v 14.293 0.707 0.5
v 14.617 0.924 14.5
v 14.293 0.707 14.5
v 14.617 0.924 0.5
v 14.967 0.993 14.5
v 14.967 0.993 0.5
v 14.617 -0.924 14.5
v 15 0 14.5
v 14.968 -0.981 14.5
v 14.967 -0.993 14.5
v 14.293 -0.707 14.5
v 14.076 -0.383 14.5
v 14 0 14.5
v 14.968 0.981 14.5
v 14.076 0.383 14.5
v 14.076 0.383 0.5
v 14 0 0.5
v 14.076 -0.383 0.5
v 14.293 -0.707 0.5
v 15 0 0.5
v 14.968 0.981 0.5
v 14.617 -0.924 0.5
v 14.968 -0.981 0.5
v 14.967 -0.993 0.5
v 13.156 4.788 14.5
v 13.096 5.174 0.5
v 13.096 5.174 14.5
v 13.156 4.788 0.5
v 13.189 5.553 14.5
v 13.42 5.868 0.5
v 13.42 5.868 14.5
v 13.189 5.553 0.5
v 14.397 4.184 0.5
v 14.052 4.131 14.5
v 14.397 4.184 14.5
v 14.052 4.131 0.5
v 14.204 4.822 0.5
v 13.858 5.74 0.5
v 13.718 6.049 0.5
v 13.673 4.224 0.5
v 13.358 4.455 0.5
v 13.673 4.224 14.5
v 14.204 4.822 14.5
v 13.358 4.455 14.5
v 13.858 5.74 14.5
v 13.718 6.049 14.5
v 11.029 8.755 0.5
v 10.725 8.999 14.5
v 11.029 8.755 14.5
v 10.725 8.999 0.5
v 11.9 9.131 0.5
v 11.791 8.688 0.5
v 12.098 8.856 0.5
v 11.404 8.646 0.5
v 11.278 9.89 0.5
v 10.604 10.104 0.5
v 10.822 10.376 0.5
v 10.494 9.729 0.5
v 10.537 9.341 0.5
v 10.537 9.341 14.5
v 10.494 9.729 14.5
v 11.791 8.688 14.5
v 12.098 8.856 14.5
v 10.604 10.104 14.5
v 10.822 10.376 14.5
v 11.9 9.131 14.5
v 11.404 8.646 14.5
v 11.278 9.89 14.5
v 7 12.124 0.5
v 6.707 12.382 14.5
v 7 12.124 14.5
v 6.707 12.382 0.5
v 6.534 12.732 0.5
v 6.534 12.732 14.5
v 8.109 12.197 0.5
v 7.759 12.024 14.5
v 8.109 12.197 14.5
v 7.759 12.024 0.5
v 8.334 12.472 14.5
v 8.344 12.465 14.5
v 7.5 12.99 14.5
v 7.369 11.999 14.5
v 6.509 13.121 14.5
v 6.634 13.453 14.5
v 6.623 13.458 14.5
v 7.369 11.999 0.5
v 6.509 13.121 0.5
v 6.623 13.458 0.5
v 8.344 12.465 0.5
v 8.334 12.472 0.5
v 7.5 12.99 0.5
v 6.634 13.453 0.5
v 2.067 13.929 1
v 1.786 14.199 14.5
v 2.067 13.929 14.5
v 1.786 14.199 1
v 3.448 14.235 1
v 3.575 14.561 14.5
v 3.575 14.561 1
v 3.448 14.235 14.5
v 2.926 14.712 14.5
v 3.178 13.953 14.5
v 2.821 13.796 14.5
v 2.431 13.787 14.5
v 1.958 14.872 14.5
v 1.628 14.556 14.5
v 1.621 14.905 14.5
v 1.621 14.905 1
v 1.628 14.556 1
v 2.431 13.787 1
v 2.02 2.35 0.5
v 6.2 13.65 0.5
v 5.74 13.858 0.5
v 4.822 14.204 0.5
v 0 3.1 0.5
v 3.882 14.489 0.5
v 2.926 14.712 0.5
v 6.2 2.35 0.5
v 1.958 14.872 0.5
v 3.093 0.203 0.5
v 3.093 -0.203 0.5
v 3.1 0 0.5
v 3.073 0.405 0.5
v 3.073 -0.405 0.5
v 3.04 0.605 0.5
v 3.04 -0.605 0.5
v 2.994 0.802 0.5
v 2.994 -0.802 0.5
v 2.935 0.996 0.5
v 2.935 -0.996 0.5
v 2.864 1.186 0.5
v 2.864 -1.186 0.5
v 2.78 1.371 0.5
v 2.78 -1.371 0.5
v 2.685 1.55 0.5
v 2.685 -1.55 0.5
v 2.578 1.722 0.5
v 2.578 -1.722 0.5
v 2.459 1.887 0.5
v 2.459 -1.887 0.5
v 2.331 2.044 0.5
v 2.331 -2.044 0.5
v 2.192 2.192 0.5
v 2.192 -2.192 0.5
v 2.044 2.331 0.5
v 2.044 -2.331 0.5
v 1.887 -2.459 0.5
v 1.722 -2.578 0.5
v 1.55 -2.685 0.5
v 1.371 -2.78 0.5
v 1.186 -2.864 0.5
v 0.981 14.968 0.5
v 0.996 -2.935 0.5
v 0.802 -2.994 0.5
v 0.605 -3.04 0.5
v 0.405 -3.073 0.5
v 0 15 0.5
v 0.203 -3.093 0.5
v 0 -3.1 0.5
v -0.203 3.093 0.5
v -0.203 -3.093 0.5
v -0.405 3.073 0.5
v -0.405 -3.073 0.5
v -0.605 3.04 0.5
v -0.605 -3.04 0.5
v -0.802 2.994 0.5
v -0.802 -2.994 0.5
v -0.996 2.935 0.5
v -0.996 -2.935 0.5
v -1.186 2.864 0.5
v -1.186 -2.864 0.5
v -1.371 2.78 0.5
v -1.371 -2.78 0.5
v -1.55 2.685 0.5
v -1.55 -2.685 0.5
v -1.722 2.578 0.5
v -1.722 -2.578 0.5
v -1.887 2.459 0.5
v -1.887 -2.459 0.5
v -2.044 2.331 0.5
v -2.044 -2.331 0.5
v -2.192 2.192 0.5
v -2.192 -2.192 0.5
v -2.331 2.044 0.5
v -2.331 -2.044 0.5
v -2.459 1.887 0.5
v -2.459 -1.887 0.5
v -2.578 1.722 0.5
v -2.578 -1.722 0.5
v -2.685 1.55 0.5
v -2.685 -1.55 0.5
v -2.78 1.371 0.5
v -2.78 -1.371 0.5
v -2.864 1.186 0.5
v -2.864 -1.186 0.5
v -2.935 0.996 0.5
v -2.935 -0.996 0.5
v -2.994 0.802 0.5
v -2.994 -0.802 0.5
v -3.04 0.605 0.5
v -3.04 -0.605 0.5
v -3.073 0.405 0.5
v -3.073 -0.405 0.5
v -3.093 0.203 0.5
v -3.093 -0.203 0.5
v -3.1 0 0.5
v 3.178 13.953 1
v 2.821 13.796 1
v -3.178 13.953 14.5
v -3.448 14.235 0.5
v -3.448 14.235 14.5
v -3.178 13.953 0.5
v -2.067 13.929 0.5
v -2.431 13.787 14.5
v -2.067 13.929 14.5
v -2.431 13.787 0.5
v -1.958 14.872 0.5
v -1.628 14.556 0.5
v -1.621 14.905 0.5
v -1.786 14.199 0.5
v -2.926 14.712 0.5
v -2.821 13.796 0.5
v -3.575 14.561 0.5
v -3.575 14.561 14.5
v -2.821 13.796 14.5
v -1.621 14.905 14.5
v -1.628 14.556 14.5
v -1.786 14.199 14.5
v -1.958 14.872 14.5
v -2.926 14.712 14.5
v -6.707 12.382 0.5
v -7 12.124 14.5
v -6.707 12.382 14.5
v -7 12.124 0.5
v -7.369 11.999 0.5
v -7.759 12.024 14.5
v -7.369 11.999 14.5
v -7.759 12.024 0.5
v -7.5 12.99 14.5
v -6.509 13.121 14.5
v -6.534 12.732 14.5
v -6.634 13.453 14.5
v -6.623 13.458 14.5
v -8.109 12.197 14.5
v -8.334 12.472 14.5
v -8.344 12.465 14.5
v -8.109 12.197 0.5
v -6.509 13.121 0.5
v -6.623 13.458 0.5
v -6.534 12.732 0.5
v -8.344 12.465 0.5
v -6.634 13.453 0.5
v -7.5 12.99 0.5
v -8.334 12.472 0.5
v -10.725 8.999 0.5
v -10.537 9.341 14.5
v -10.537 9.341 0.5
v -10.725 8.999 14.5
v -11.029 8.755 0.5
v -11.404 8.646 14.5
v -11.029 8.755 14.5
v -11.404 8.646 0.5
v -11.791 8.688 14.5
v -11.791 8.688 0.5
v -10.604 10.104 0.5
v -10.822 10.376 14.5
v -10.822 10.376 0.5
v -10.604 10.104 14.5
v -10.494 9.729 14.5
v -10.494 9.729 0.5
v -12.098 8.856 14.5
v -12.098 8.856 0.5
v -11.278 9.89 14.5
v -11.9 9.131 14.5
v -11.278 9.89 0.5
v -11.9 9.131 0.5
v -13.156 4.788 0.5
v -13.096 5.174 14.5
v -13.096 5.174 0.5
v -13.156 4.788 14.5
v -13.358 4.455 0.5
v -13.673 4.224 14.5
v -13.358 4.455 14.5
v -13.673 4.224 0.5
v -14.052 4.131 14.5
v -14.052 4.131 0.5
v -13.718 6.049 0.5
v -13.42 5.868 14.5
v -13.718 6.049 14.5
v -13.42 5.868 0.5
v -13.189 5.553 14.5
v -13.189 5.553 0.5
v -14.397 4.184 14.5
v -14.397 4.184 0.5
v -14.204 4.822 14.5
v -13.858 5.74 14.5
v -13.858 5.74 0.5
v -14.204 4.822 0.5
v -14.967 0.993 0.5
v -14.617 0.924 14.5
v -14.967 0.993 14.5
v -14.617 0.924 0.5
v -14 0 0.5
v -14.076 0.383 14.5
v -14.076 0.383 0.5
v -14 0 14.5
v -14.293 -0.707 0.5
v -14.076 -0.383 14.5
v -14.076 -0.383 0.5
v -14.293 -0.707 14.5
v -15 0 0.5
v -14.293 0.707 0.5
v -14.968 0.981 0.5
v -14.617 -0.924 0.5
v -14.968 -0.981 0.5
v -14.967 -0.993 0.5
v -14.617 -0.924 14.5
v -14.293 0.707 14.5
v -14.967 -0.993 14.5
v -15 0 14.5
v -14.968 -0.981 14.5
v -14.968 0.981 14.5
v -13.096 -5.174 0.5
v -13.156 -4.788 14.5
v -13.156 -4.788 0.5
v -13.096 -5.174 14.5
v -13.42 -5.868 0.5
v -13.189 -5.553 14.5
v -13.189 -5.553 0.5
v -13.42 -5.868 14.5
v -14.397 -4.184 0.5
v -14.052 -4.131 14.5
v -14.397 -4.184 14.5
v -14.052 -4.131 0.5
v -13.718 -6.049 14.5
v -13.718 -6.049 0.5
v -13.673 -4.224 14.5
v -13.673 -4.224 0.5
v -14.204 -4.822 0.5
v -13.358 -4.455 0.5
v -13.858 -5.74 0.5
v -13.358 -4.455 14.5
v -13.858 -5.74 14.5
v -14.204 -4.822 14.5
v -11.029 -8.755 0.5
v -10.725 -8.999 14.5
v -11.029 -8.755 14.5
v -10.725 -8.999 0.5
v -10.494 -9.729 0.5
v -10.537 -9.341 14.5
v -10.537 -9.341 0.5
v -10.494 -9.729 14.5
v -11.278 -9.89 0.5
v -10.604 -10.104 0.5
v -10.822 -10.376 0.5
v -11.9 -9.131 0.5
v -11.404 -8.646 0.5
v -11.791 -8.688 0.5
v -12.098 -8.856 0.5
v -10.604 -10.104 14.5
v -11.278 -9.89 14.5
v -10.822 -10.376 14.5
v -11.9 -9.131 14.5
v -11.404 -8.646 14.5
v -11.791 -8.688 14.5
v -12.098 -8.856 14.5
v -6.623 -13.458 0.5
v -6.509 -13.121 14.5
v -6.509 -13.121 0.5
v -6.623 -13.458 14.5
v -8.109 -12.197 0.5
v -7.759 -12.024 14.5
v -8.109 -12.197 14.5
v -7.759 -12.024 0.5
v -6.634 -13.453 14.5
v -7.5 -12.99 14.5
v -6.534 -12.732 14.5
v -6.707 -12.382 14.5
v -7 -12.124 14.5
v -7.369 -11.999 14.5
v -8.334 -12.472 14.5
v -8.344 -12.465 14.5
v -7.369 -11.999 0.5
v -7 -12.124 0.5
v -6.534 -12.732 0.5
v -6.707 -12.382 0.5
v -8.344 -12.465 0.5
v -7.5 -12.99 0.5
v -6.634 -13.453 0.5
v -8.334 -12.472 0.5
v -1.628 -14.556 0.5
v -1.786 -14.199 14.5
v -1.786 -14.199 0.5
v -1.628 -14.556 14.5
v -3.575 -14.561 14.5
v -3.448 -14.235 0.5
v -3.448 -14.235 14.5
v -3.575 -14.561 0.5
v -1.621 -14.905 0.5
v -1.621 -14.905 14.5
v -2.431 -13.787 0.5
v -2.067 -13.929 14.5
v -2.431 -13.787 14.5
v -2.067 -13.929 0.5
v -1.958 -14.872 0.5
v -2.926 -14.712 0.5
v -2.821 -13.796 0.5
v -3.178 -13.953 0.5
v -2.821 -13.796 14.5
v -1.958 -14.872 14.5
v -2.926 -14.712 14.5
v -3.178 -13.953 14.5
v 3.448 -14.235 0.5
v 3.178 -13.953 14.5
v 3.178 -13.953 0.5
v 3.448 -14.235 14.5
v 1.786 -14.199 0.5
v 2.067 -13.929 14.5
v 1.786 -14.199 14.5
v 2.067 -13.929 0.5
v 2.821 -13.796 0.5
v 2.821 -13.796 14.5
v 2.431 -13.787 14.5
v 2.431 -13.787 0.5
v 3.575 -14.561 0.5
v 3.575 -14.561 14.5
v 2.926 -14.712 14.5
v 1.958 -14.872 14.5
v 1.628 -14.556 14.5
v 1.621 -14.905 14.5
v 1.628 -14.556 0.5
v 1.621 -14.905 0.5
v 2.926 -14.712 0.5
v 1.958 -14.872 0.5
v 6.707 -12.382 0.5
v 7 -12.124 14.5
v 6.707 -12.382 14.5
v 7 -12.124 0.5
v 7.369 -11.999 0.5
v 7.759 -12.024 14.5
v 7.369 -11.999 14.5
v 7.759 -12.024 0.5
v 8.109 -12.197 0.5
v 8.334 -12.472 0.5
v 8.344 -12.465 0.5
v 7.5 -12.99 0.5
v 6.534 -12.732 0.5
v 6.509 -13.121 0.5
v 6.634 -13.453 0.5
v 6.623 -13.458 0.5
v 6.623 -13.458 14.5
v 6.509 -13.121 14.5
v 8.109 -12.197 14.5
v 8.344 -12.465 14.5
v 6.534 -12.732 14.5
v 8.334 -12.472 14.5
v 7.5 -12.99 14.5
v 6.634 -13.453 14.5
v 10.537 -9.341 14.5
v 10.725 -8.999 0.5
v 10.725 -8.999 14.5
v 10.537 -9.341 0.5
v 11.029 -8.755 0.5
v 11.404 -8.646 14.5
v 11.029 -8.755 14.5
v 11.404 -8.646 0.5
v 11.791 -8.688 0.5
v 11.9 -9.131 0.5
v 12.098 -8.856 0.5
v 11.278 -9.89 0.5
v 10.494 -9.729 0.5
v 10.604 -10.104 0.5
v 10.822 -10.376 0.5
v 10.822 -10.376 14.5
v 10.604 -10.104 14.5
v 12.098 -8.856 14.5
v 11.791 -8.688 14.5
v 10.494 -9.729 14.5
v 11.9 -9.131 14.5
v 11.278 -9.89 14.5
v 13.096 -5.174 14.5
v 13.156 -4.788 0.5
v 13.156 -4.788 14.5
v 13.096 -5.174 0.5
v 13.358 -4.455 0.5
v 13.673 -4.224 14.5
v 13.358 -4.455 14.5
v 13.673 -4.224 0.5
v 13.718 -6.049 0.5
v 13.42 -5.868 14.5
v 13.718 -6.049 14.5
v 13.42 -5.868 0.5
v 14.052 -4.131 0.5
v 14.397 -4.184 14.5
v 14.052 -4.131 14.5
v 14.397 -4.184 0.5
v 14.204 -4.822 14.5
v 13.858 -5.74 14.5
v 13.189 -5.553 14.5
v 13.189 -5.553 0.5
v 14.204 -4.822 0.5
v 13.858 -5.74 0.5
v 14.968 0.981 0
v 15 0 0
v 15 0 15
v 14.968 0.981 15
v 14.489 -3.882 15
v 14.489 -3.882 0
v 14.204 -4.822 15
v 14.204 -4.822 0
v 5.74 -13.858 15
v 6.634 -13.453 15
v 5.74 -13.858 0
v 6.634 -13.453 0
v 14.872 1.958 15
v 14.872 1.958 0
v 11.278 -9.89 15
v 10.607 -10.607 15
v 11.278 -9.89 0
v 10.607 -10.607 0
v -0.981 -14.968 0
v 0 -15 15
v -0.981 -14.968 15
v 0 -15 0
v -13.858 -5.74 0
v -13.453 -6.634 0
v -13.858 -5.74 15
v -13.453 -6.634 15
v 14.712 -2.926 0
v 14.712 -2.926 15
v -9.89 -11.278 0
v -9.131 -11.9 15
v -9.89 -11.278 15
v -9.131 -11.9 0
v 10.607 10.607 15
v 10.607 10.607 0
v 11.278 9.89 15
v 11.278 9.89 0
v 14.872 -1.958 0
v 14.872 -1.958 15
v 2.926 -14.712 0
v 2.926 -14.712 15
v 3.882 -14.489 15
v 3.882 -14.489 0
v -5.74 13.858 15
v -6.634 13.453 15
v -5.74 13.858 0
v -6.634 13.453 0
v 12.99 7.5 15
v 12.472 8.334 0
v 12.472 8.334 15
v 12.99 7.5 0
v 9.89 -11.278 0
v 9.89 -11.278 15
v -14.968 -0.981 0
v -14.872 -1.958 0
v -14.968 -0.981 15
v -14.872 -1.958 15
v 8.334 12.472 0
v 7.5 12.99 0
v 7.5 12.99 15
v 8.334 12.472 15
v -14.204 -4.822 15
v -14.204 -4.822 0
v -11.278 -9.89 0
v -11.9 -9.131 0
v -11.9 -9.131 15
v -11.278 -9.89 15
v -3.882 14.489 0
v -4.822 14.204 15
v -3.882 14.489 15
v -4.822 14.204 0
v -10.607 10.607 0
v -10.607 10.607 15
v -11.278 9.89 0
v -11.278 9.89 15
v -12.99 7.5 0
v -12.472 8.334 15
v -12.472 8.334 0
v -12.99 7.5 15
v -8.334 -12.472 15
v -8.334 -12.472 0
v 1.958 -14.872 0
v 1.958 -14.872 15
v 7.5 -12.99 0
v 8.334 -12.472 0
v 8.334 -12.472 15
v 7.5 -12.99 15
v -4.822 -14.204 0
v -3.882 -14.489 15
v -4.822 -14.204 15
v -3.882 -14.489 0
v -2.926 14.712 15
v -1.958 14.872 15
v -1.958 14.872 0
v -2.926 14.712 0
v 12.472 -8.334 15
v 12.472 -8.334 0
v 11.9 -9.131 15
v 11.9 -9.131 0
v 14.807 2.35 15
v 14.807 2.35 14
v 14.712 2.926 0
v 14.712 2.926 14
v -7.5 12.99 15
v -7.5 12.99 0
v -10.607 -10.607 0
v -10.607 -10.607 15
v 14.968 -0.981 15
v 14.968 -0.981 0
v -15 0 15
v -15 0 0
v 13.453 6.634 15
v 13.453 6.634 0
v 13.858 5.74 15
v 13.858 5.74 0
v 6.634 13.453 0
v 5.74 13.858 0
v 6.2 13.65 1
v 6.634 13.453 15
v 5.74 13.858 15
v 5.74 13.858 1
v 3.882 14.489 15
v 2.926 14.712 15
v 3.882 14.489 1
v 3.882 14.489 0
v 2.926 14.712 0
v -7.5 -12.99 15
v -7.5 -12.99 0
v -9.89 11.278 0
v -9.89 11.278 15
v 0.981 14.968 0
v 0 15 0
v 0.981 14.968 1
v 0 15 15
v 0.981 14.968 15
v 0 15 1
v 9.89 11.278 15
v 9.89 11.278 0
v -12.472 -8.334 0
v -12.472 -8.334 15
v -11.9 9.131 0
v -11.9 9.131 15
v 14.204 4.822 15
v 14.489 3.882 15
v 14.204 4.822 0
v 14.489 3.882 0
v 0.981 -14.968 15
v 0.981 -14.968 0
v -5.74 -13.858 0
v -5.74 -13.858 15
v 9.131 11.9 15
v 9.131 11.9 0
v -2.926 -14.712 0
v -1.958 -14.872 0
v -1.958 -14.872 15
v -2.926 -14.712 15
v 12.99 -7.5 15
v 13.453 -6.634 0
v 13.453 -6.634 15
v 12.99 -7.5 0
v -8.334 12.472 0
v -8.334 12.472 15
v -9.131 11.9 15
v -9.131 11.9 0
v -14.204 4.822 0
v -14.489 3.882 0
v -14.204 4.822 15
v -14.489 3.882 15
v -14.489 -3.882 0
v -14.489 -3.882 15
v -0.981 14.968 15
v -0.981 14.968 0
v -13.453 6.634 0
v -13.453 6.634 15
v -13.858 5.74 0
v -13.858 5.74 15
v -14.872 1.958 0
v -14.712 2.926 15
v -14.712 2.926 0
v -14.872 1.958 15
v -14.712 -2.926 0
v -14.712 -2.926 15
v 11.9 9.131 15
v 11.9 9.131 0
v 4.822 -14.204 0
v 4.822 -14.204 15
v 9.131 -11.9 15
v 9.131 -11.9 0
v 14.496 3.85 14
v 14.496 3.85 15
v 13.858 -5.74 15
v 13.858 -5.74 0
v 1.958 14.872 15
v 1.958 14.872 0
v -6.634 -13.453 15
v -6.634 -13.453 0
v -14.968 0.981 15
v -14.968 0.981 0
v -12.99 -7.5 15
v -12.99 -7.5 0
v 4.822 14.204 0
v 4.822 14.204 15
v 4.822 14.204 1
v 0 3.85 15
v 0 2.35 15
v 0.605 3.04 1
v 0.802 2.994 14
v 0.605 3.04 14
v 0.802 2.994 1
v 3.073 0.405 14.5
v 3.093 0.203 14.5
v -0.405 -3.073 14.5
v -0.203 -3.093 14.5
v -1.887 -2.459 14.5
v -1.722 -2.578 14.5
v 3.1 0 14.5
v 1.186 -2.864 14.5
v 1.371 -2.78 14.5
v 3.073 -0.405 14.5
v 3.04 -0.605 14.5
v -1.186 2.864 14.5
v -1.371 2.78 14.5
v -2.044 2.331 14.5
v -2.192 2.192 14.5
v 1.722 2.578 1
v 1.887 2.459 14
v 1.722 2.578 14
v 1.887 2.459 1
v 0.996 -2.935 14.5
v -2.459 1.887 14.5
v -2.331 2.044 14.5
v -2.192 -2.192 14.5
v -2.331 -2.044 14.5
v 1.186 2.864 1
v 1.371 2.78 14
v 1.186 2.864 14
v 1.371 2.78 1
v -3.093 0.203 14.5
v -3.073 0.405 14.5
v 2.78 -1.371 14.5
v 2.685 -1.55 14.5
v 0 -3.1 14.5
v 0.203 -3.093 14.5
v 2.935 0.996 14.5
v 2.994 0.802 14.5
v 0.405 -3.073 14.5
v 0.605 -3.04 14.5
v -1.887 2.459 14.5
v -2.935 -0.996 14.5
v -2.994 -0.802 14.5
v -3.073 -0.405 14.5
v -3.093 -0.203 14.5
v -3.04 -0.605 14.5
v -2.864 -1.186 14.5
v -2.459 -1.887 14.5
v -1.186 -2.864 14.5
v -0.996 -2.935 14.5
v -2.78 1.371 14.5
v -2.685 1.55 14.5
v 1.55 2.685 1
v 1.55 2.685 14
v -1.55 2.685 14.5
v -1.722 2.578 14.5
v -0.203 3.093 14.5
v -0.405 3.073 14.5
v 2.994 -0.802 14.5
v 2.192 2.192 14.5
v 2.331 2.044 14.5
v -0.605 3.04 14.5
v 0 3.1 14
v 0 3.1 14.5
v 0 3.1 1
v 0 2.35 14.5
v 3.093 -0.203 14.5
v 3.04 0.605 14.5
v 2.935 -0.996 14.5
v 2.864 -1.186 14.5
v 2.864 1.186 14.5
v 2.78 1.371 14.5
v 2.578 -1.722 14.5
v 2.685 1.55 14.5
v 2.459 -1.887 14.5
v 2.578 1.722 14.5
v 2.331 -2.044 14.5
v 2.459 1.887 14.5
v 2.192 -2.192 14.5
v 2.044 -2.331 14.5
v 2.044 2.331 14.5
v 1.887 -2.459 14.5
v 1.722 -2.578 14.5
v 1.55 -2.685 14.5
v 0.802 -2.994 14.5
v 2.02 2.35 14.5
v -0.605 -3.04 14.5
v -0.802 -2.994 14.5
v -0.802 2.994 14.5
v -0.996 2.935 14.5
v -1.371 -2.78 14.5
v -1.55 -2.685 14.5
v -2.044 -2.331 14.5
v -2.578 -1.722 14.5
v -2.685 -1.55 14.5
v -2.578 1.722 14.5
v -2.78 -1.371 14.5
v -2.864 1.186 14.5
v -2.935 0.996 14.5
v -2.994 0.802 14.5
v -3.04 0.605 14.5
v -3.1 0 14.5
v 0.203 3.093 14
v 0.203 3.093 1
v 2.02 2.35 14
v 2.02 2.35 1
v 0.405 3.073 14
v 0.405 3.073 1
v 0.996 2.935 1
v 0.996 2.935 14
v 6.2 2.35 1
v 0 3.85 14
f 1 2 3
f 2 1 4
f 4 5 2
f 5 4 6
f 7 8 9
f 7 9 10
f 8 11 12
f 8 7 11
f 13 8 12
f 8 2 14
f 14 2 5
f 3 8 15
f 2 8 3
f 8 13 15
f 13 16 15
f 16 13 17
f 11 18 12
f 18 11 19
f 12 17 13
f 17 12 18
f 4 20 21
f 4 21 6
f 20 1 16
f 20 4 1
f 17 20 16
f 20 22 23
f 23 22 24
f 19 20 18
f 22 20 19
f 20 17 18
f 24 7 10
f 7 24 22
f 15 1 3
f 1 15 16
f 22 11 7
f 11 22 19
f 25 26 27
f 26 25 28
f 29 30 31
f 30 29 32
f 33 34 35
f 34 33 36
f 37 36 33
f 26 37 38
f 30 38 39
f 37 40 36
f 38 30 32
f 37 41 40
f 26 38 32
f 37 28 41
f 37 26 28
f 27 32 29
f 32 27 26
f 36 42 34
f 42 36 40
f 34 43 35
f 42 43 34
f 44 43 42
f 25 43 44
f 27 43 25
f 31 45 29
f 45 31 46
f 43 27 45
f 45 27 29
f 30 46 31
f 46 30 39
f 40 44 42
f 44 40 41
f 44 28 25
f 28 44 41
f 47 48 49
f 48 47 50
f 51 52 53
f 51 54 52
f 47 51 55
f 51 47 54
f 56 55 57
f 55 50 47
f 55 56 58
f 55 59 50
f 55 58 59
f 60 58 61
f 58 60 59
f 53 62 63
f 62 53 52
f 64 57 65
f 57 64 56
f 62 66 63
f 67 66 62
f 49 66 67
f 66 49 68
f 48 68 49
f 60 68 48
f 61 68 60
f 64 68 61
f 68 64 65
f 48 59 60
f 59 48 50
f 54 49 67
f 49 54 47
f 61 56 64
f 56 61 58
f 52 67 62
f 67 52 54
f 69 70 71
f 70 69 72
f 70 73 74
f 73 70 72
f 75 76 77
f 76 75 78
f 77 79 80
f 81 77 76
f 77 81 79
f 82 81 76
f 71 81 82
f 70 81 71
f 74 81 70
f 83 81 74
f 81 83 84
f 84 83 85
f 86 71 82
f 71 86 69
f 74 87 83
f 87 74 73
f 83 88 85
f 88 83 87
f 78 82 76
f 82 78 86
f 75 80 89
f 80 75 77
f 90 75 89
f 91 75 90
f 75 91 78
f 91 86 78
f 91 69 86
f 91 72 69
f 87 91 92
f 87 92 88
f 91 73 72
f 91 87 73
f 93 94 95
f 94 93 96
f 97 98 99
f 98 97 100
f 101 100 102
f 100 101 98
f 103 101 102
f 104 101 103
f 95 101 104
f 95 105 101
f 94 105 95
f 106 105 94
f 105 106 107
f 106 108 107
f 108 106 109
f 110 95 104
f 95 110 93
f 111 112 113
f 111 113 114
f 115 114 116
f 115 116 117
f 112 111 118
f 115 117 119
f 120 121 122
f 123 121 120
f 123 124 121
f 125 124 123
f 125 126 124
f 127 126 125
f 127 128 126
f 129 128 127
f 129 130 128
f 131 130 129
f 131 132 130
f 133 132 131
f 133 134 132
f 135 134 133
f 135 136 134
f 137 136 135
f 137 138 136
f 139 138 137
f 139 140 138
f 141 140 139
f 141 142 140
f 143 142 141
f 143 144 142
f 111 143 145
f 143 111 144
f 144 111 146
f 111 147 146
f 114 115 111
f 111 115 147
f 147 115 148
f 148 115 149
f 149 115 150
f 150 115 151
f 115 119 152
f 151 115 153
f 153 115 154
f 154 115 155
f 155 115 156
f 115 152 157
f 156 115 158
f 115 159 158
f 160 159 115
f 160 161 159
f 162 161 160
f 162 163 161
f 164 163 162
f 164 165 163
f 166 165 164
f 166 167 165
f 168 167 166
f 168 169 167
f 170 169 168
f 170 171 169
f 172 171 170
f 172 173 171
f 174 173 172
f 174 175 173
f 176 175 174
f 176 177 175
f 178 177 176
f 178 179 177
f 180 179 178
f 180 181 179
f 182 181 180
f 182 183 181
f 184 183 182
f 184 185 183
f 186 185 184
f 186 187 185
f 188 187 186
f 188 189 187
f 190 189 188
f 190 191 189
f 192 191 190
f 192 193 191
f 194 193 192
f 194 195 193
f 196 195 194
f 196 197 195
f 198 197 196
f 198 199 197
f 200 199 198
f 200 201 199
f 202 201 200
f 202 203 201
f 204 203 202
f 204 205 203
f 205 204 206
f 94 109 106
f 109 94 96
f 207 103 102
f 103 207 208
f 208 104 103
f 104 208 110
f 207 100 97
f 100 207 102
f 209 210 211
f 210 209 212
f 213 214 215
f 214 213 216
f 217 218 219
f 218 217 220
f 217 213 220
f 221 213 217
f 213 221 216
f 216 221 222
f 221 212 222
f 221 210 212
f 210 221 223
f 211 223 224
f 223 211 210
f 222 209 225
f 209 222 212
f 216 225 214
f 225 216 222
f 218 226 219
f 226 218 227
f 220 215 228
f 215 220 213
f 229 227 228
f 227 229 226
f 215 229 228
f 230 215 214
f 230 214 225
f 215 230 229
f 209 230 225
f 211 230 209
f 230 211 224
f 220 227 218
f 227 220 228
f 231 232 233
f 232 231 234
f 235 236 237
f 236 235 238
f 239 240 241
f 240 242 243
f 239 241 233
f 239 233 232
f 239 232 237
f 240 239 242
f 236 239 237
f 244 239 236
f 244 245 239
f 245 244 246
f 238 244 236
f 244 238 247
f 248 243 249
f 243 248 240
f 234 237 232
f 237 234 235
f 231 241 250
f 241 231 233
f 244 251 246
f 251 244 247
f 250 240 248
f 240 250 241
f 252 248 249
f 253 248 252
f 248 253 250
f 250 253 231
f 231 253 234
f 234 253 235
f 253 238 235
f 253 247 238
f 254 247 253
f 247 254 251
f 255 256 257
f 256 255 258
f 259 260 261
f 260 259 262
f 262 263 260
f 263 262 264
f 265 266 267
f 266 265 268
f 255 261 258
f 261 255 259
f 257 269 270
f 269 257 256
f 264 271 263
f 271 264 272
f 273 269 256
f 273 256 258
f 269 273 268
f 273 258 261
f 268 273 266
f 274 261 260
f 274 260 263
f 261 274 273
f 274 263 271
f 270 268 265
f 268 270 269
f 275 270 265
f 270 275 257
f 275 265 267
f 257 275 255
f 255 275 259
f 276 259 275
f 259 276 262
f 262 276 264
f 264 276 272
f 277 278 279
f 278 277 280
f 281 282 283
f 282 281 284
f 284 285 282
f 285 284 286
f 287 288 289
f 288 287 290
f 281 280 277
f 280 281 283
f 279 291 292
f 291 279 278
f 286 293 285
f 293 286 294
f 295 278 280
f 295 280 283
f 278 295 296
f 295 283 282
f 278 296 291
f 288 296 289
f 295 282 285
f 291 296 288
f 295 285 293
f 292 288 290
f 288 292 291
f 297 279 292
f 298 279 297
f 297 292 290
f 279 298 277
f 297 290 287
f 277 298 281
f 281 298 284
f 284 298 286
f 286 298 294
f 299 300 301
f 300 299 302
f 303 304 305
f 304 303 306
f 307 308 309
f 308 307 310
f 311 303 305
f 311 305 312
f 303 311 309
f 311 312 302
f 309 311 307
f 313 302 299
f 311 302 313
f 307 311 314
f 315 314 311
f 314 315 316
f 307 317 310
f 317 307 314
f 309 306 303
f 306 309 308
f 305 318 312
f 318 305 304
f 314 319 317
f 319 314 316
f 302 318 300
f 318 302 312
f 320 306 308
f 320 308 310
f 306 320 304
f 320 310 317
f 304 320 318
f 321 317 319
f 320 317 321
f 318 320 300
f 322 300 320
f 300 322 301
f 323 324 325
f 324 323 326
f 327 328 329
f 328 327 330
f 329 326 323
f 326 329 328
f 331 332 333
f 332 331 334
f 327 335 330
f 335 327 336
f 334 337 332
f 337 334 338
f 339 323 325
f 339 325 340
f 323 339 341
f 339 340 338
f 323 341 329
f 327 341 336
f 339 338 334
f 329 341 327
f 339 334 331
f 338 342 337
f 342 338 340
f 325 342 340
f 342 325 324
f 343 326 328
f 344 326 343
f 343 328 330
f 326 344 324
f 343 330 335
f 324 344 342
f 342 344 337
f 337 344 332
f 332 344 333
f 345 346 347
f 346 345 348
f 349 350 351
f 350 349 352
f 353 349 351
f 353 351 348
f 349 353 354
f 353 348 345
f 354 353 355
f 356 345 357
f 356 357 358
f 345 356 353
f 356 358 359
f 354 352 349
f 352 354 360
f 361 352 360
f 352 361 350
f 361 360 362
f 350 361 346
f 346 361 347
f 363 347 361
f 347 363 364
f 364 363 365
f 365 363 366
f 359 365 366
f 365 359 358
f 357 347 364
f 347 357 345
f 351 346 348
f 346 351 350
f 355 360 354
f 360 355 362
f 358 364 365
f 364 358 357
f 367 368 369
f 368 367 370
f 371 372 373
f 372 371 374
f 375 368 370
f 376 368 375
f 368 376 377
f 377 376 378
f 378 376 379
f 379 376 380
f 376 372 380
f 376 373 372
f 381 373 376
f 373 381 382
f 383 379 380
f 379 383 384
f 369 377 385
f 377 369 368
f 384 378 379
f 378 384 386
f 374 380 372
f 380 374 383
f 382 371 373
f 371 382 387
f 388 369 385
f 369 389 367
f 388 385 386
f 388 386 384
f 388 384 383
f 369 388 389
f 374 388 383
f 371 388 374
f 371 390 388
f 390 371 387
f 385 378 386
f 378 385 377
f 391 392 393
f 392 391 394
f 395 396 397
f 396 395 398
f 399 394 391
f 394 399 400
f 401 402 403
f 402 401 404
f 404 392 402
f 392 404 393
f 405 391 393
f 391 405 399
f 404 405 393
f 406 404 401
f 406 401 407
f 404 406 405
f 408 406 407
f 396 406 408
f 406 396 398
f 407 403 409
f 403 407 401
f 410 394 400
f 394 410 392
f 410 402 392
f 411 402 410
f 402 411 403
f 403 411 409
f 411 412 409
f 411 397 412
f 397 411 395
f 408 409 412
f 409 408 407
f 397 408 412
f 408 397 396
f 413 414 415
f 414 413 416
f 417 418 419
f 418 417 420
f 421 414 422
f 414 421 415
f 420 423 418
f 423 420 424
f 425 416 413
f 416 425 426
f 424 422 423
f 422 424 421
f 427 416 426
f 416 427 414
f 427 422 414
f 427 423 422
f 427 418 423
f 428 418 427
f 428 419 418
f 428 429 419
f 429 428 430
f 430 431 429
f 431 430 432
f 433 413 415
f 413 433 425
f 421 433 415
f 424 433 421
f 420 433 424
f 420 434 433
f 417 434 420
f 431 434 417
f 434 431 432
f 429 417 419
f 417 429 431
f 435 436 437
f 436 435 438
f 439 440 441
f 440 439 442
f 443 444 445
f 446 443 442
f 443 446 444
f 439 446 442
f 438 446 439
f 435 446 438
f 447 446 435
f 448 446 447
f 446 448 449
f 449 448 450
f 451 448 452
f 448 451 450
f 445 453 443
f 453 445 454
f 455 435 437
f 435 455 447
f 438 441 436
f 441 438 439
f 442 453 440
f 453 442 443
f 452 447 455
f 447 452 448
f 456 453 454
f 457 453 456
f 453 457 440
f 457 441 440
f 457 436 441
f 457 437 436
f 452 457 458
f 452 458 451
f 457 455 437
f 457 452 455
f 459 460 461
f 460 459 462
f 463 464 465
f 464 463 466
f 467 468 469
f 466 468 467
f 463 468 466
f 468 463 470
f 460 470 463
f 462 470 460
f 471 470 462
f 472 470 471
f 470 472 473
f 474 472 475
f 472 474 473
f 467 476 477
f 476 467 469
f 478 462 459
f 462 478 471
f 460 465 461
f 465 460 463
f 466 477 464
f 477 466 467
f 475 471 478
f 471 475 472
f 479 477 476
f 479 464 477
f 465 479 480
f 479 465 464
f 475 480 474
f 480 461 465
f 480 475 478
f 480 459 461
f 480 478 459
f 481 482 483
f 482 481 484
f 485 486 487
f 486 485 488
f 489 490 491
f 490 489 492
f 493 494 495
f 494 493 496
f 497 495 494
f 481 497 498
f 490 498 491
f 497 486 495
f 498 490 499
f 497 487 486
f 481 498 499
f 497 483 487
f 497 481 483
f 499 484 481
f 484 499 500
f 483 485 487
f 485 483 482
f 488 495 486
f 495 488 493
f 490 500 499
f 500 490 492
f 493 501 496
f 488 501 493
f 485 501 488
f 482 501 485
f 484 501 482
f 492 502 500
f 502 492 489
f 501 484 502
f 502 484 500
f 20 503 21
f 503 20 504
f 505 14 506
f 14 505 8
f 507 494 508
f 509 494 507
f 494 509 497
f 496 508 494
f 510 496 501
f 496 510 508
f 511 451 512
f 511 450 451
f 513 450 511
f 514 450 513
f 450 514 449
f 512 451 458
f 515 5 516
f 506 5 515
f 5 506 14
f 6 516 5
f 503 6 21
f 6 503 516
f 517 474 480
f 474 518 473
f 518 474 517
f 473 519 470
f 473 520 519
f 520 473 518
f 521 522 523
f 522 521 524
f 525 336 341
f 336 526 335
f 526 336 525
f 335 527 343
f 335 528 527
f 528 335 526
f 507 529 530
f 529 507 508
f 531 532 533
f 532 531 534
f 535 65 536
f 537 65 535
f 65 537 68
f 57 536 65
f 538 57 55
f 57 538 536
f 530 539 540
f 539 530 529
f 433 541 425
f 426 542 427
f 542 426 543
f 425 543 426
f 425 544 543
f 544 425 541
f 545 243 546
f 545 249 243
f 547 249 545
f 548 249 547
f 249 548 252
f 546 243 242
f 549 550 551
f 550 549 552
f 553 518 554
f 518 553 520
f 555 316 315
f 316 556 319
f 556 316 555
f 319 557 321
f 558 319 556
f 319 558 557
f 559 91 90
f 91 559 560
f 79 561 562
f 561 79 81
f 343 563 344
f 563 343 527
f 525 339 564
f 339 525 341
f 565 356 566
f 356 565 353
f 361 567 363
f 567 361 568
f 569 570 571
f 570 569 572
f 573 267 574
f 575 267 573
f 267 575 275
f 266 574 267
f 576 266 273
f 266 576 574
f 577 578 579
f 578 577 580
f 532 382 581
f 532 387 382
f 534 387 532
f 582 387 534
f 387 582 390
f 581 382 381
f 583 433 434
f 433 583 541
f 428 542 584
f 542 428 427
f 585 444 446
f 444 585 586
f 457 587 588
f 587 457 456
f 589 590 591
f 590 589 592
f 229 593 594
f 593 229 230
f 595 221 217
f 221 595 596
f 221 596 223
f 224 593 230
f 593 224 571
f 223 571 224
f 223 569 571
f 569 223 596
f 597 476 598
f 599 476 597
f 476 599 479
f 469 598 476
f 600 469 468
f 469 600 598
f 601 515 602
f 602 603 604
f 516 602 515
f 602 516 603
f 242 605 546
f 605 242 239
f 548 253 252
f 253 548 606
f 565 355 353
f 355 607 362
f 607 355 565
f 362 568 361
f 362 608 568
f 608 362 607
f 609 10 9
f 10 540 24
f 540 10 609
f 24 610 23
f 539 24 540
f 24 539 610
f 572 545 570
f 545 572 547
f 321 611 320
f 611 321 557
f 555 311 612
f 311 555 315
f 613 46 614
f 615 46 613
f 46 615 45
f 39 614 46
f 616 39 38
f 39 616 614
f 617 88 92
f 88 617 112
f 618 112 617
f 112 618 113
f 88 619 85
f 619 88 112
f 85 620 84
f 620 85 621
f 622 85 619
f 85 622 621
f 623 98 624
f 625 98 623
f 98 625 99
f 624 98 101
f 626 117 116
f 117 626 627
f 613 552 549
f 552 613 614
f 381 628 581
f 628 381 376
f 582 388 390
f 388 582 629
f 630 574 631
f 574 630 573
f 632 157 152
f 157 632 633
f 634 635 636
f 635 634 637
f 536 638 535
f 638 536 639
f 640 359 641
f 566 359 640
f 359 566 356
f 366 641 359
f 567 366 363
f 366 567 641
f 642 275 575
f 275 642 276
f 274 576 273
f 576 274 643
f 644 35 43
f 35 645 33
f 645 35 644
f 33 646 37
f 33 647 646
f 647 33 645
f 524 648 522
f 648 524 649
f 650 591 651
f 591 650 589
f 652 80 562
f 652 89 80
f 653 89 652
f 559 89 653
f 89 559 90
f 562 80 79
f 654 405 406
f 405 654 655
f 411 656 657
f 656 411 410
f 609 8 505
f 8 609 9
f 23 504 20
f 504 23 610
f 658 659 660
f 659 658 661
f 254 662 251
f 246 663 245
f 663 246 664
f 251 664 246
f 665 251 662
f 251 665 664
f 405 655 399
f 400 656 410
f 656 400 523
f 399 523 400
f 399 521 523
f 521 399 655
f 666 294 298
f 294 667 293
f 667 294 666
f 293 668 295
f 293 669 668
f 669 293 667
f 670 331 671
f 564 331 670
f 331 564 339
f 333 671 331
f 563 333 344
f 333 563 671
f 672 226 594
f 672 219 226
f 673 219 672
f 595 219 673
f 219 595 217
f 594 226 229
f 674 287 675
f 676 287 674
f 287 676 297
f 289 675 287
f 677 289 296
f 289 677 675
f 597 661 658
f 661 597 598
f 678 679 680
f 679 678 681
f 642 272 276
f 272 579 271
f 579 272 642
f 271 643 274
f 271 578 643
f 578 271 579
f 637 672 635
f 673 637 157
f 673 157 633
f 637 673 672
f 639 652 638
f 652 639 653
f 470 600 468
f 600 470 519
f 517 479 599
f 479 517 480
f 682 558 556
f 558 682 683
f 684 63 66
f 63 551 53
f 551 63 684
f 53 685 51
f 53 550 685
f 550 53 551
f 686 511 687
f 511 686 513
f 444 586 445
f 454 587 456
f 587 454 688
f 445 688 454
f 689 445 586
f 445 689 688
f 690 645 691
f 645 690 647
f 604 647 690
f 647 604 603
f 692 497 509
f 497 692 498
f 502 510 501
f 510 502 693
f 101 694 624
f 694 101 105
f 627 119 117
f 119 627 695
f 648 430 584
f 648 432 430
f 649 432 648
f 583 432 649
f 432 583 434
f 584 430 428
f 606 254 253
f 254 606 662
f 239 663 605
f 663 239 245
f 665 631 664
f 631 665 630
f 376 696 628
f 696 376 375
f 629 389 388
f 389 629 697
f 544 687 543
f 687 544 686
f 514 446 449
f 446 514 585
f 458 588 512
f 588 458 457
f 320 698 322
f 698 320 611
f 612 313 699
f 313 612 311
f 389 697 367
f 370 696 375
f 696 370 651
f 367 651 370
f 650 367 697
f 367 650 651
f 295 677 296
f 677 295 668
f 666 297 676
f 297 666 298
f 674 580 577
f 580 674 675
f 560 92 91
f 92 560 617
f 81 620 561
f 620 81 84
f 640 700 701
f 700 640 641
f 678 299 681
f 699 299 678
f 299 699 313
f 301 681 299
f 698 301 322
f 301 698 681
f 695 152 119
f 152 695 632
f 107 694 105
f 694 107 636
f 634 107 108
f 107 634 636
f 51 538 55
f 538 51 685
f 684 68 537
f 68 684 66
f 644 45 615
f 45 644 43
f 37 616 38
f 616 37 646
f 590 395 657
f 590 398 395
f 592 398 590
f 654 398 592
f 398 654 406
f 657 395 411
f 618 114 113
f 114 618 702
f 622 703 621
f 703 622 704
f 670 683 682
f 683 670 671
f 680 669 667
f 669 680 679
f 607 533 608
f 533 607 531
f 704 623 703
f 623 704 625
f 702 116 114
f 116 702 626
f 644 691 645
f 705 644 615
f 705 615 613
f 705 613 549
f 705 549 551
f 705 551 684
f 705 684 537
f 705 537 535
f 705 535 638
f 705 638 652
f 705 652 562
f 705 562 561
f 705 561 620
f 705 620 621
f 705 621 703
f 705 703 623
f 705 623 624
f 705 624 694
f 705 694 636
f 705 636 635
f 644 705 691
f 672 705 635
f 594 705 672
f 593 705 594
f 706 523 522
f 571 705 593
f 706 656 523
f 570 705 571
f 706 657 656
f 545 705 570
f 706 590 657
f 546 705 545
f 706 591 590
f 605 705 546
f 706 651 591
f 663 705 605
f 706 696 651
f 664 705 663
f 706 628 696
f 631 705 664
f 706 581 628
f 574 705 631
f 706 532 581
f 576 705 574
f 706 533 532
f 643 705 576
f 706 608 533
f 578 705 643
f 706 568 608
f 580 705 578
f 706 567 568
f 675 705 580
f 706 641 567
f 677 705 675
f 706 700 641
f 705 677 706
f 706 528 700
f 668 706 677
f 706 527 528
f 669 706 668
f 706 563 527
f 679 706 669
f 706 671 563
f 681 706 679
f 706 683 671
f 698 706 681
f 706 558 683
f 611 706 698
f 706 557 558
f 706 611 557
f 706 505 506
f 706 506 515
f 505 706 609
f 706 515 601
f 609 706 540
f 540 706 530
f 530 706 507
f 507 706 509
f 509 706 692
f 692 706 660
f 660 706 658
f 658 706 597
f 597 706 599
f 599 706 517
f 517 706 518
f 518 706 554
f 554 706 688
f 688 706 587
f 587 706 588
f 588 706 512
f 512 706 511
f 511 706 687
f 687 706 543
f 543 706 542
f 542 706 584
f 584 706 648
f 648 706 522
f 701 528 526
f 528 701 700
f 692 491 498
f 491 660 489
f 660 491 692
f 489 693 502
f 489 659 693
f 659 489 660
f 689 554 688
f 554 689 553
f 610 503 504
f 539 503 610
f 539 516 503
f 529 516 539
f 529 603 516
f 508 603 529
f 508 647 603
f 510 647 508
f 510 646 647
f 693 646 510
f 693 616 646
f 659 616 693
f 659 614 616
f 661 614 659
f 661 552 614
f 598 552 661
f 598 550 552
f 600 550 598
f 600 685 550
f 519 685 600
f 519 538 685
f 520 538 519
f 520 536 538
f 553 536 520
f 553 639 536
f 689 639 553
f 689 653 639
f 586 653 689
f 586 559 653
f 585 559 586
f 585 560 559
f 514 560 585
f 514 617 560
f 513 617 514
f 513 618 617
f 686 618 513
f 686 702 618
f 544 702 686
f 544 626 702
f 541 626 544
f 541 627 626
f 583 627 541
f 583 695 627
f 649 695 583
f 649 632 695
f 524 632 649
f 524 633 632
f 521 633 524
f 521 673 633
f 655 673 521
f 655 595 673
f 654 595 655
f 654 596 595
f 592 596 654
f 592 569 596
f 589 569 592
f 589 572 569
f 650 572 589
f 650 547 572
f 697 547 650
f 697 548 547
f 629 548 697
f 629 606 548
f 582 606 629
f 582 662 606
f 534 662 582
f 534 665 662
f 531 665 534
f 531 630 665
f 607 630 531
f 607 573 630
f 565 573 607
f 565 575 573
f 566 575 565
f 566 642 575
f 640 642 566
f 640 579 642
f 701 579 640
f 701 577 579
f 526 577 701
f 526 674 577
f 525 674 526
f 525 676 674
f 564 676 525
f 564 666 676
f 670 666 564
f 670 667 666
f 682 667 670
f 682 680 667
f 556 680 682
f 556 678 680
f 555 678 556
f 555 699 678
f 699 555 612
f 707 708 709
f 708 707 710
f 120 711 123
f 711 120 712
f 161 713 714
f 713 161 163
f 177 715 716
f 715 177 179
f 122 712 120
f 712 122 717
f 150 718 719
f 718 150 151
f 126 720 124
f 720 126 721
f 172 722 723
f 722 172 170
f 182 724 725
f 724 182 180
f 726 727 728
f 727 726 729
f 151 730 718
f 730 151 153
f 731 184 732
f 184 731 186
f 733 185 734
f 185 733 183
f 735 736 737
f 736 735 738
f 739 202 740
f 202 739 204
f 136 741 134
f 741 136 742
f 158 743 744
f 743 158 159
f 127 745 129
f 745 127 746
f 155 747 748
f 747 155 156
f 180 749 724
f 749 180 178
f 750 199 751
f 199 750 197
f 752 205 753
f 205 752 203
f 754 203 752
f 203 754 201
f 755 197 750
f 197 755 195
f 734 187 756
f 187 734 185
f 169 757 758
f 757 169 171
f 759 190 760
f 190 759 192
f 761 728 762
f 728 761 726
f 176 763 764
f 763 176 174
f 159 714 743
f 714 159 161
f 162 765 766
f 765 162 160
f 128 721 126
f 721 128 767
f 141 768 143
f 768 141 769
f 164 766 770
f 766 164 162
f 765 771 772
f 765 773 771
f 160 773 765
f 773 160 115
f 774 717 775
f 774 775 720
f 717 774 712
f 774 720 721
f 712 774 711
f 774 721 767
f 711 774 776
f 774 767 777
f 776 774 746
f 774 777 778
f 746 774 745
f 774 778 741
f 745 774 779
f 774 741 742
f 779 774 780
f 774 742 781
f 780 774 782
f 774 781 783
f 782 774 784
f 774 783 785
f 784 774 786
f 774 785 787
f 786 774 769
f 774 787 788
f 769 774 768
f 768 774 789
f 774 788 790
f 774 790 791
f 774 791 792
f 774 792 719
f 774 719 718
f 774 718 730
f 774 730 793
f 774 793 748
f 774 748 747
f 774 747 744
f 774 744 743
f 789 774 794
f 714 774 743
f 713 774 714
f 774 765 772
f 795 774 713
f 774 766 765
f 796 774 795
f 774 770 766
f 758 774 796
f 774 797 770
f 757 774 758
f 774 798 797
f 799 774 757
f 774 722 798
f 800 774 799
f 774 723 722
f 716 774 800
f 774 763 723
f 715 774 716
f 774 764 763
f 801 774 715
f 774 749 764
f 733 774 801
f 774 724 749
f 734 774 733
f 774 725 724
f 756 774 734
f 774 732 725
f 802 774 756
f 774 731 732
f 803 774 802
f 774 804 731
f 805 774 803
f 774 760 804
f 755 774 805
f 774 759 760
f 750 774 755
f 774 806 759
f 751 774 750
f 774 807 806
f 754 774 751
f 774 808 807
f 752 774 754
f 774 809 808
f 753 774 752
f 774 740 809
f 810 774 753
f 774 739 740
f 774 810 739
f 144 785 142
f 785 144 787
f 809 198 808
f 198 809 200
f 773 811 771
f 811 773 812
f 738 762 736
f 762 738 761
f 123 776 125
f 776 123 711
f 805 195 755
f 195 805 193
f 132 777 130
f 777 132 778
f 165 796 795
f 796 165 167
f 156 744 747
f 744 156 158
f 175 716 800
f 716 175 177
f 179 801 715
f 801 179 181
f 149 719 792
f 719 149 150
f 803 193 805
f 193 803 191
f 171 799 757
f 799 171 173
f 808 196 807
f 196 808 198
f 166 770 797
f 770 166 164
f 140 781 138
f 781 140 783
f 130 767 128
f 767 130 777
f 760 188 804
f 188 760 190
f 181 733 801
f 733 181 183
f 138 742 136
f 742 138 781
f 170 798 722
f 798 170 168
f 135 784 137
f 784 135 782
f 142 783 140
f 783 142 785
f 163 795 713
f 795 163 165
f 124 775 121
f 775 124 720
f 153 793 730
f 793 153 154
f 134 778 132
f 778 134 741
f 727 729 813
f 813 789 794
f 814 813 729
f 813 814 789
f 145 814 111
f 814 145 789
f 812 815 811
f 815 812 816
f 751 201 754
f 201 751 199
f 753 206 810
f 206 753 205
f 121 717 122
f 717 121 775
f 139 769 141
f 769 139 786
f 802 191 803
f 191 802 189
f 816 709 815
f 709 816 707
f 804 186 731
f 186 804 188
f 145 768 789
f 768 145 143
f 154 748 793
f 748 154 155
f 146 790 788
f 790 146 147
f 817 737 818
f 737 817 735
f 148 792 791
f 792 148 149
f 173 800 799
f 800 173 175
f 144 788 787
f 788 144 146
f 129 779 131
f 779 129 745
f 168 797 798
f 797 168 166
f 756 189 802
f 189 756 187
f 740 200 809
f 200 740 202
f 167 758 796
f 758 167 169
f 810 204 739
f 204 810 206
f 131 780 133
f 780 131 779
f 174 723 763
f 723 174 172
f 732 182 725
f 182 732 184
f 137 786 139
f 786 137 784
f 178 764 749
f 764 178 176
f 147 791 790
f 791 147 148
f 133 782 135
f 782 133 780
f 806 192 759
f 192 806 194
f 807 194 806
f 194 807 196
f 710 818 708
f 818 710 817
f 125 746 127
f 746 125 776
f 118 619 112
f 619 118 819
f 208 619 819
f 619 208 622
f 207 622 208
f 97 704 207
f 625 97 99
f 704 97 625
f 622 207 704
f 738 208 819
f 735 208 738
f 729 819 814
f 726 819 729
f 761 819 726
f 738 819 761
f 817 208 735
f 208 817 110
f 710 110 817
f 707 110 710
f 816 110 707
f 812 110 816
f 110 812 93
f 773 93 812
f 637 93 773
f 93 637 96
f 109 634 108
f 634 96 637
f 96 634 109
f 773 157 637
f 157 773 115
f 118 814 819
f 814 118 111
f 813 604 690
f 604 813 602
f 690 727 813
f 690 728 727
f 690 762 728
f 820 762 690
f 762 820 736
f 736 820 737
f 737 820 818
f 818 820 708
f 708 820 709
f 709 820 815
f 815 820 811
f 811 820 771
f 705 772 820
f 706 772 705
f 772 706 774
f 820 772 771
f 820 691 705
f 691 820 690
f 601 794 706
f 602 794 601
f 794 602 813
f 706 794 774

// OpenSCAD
// Replacement knob for a hotplate stirrer with a 6 mm D-shaft
// Print orientation: bottom face (with D-bore) on the bed, z = 0

$fn = 96;

// --- Dimensions (mm) ---
knob_d        = 30;    // knob outer diameter
knob_h        = 15;    // knob height
shaft_d       = 6.2;   // D-shaft bore diameter
shaft_flat    = 4.7;   // distance from D-flat to opposite side of circle
groove_count  = 18;    // number of vertical grip grooves
groove_d      = 2;     // groove diameter (half-cylinder)
pointer_w     = 1.5;   // pointer groove width
pointer_d     = 1;     // pointer groove depth
eps           = 0.5;   // overcut for clean differences

difference() {
    // Main body
    cylinder(d = knob_d, h = knob_h);

    // D-shaped blind bore from bottom face
    translate([0, 0, eps])
        linear_extrude(height = knob_h - 2 * eps)
            circle(d = shaft_d);
    // Flat on the D (remove the +y half of the disc)
    translate([0, shaft_flat / 2, eps])
        cube([shaft_d, knob_h - 2 * eps, eps]);

    // Vertical grip grooves around the outside
    for (i = [0 : groove_count - 1])
        rotate([0, 0, i * 360 / groove_count])
            translate([knob_d / 2, 0, eps])
                cylinder(d = groove_d, h = knob_h - 2 * eps, $fn = 16);

    // Pointer groove from centre to outer edge on the same side as the flat
    translate([0, shaft_flat / 2, knob_h - pointer_d])
        cube([knob_d, pointer_w, pointer_d]);
}
